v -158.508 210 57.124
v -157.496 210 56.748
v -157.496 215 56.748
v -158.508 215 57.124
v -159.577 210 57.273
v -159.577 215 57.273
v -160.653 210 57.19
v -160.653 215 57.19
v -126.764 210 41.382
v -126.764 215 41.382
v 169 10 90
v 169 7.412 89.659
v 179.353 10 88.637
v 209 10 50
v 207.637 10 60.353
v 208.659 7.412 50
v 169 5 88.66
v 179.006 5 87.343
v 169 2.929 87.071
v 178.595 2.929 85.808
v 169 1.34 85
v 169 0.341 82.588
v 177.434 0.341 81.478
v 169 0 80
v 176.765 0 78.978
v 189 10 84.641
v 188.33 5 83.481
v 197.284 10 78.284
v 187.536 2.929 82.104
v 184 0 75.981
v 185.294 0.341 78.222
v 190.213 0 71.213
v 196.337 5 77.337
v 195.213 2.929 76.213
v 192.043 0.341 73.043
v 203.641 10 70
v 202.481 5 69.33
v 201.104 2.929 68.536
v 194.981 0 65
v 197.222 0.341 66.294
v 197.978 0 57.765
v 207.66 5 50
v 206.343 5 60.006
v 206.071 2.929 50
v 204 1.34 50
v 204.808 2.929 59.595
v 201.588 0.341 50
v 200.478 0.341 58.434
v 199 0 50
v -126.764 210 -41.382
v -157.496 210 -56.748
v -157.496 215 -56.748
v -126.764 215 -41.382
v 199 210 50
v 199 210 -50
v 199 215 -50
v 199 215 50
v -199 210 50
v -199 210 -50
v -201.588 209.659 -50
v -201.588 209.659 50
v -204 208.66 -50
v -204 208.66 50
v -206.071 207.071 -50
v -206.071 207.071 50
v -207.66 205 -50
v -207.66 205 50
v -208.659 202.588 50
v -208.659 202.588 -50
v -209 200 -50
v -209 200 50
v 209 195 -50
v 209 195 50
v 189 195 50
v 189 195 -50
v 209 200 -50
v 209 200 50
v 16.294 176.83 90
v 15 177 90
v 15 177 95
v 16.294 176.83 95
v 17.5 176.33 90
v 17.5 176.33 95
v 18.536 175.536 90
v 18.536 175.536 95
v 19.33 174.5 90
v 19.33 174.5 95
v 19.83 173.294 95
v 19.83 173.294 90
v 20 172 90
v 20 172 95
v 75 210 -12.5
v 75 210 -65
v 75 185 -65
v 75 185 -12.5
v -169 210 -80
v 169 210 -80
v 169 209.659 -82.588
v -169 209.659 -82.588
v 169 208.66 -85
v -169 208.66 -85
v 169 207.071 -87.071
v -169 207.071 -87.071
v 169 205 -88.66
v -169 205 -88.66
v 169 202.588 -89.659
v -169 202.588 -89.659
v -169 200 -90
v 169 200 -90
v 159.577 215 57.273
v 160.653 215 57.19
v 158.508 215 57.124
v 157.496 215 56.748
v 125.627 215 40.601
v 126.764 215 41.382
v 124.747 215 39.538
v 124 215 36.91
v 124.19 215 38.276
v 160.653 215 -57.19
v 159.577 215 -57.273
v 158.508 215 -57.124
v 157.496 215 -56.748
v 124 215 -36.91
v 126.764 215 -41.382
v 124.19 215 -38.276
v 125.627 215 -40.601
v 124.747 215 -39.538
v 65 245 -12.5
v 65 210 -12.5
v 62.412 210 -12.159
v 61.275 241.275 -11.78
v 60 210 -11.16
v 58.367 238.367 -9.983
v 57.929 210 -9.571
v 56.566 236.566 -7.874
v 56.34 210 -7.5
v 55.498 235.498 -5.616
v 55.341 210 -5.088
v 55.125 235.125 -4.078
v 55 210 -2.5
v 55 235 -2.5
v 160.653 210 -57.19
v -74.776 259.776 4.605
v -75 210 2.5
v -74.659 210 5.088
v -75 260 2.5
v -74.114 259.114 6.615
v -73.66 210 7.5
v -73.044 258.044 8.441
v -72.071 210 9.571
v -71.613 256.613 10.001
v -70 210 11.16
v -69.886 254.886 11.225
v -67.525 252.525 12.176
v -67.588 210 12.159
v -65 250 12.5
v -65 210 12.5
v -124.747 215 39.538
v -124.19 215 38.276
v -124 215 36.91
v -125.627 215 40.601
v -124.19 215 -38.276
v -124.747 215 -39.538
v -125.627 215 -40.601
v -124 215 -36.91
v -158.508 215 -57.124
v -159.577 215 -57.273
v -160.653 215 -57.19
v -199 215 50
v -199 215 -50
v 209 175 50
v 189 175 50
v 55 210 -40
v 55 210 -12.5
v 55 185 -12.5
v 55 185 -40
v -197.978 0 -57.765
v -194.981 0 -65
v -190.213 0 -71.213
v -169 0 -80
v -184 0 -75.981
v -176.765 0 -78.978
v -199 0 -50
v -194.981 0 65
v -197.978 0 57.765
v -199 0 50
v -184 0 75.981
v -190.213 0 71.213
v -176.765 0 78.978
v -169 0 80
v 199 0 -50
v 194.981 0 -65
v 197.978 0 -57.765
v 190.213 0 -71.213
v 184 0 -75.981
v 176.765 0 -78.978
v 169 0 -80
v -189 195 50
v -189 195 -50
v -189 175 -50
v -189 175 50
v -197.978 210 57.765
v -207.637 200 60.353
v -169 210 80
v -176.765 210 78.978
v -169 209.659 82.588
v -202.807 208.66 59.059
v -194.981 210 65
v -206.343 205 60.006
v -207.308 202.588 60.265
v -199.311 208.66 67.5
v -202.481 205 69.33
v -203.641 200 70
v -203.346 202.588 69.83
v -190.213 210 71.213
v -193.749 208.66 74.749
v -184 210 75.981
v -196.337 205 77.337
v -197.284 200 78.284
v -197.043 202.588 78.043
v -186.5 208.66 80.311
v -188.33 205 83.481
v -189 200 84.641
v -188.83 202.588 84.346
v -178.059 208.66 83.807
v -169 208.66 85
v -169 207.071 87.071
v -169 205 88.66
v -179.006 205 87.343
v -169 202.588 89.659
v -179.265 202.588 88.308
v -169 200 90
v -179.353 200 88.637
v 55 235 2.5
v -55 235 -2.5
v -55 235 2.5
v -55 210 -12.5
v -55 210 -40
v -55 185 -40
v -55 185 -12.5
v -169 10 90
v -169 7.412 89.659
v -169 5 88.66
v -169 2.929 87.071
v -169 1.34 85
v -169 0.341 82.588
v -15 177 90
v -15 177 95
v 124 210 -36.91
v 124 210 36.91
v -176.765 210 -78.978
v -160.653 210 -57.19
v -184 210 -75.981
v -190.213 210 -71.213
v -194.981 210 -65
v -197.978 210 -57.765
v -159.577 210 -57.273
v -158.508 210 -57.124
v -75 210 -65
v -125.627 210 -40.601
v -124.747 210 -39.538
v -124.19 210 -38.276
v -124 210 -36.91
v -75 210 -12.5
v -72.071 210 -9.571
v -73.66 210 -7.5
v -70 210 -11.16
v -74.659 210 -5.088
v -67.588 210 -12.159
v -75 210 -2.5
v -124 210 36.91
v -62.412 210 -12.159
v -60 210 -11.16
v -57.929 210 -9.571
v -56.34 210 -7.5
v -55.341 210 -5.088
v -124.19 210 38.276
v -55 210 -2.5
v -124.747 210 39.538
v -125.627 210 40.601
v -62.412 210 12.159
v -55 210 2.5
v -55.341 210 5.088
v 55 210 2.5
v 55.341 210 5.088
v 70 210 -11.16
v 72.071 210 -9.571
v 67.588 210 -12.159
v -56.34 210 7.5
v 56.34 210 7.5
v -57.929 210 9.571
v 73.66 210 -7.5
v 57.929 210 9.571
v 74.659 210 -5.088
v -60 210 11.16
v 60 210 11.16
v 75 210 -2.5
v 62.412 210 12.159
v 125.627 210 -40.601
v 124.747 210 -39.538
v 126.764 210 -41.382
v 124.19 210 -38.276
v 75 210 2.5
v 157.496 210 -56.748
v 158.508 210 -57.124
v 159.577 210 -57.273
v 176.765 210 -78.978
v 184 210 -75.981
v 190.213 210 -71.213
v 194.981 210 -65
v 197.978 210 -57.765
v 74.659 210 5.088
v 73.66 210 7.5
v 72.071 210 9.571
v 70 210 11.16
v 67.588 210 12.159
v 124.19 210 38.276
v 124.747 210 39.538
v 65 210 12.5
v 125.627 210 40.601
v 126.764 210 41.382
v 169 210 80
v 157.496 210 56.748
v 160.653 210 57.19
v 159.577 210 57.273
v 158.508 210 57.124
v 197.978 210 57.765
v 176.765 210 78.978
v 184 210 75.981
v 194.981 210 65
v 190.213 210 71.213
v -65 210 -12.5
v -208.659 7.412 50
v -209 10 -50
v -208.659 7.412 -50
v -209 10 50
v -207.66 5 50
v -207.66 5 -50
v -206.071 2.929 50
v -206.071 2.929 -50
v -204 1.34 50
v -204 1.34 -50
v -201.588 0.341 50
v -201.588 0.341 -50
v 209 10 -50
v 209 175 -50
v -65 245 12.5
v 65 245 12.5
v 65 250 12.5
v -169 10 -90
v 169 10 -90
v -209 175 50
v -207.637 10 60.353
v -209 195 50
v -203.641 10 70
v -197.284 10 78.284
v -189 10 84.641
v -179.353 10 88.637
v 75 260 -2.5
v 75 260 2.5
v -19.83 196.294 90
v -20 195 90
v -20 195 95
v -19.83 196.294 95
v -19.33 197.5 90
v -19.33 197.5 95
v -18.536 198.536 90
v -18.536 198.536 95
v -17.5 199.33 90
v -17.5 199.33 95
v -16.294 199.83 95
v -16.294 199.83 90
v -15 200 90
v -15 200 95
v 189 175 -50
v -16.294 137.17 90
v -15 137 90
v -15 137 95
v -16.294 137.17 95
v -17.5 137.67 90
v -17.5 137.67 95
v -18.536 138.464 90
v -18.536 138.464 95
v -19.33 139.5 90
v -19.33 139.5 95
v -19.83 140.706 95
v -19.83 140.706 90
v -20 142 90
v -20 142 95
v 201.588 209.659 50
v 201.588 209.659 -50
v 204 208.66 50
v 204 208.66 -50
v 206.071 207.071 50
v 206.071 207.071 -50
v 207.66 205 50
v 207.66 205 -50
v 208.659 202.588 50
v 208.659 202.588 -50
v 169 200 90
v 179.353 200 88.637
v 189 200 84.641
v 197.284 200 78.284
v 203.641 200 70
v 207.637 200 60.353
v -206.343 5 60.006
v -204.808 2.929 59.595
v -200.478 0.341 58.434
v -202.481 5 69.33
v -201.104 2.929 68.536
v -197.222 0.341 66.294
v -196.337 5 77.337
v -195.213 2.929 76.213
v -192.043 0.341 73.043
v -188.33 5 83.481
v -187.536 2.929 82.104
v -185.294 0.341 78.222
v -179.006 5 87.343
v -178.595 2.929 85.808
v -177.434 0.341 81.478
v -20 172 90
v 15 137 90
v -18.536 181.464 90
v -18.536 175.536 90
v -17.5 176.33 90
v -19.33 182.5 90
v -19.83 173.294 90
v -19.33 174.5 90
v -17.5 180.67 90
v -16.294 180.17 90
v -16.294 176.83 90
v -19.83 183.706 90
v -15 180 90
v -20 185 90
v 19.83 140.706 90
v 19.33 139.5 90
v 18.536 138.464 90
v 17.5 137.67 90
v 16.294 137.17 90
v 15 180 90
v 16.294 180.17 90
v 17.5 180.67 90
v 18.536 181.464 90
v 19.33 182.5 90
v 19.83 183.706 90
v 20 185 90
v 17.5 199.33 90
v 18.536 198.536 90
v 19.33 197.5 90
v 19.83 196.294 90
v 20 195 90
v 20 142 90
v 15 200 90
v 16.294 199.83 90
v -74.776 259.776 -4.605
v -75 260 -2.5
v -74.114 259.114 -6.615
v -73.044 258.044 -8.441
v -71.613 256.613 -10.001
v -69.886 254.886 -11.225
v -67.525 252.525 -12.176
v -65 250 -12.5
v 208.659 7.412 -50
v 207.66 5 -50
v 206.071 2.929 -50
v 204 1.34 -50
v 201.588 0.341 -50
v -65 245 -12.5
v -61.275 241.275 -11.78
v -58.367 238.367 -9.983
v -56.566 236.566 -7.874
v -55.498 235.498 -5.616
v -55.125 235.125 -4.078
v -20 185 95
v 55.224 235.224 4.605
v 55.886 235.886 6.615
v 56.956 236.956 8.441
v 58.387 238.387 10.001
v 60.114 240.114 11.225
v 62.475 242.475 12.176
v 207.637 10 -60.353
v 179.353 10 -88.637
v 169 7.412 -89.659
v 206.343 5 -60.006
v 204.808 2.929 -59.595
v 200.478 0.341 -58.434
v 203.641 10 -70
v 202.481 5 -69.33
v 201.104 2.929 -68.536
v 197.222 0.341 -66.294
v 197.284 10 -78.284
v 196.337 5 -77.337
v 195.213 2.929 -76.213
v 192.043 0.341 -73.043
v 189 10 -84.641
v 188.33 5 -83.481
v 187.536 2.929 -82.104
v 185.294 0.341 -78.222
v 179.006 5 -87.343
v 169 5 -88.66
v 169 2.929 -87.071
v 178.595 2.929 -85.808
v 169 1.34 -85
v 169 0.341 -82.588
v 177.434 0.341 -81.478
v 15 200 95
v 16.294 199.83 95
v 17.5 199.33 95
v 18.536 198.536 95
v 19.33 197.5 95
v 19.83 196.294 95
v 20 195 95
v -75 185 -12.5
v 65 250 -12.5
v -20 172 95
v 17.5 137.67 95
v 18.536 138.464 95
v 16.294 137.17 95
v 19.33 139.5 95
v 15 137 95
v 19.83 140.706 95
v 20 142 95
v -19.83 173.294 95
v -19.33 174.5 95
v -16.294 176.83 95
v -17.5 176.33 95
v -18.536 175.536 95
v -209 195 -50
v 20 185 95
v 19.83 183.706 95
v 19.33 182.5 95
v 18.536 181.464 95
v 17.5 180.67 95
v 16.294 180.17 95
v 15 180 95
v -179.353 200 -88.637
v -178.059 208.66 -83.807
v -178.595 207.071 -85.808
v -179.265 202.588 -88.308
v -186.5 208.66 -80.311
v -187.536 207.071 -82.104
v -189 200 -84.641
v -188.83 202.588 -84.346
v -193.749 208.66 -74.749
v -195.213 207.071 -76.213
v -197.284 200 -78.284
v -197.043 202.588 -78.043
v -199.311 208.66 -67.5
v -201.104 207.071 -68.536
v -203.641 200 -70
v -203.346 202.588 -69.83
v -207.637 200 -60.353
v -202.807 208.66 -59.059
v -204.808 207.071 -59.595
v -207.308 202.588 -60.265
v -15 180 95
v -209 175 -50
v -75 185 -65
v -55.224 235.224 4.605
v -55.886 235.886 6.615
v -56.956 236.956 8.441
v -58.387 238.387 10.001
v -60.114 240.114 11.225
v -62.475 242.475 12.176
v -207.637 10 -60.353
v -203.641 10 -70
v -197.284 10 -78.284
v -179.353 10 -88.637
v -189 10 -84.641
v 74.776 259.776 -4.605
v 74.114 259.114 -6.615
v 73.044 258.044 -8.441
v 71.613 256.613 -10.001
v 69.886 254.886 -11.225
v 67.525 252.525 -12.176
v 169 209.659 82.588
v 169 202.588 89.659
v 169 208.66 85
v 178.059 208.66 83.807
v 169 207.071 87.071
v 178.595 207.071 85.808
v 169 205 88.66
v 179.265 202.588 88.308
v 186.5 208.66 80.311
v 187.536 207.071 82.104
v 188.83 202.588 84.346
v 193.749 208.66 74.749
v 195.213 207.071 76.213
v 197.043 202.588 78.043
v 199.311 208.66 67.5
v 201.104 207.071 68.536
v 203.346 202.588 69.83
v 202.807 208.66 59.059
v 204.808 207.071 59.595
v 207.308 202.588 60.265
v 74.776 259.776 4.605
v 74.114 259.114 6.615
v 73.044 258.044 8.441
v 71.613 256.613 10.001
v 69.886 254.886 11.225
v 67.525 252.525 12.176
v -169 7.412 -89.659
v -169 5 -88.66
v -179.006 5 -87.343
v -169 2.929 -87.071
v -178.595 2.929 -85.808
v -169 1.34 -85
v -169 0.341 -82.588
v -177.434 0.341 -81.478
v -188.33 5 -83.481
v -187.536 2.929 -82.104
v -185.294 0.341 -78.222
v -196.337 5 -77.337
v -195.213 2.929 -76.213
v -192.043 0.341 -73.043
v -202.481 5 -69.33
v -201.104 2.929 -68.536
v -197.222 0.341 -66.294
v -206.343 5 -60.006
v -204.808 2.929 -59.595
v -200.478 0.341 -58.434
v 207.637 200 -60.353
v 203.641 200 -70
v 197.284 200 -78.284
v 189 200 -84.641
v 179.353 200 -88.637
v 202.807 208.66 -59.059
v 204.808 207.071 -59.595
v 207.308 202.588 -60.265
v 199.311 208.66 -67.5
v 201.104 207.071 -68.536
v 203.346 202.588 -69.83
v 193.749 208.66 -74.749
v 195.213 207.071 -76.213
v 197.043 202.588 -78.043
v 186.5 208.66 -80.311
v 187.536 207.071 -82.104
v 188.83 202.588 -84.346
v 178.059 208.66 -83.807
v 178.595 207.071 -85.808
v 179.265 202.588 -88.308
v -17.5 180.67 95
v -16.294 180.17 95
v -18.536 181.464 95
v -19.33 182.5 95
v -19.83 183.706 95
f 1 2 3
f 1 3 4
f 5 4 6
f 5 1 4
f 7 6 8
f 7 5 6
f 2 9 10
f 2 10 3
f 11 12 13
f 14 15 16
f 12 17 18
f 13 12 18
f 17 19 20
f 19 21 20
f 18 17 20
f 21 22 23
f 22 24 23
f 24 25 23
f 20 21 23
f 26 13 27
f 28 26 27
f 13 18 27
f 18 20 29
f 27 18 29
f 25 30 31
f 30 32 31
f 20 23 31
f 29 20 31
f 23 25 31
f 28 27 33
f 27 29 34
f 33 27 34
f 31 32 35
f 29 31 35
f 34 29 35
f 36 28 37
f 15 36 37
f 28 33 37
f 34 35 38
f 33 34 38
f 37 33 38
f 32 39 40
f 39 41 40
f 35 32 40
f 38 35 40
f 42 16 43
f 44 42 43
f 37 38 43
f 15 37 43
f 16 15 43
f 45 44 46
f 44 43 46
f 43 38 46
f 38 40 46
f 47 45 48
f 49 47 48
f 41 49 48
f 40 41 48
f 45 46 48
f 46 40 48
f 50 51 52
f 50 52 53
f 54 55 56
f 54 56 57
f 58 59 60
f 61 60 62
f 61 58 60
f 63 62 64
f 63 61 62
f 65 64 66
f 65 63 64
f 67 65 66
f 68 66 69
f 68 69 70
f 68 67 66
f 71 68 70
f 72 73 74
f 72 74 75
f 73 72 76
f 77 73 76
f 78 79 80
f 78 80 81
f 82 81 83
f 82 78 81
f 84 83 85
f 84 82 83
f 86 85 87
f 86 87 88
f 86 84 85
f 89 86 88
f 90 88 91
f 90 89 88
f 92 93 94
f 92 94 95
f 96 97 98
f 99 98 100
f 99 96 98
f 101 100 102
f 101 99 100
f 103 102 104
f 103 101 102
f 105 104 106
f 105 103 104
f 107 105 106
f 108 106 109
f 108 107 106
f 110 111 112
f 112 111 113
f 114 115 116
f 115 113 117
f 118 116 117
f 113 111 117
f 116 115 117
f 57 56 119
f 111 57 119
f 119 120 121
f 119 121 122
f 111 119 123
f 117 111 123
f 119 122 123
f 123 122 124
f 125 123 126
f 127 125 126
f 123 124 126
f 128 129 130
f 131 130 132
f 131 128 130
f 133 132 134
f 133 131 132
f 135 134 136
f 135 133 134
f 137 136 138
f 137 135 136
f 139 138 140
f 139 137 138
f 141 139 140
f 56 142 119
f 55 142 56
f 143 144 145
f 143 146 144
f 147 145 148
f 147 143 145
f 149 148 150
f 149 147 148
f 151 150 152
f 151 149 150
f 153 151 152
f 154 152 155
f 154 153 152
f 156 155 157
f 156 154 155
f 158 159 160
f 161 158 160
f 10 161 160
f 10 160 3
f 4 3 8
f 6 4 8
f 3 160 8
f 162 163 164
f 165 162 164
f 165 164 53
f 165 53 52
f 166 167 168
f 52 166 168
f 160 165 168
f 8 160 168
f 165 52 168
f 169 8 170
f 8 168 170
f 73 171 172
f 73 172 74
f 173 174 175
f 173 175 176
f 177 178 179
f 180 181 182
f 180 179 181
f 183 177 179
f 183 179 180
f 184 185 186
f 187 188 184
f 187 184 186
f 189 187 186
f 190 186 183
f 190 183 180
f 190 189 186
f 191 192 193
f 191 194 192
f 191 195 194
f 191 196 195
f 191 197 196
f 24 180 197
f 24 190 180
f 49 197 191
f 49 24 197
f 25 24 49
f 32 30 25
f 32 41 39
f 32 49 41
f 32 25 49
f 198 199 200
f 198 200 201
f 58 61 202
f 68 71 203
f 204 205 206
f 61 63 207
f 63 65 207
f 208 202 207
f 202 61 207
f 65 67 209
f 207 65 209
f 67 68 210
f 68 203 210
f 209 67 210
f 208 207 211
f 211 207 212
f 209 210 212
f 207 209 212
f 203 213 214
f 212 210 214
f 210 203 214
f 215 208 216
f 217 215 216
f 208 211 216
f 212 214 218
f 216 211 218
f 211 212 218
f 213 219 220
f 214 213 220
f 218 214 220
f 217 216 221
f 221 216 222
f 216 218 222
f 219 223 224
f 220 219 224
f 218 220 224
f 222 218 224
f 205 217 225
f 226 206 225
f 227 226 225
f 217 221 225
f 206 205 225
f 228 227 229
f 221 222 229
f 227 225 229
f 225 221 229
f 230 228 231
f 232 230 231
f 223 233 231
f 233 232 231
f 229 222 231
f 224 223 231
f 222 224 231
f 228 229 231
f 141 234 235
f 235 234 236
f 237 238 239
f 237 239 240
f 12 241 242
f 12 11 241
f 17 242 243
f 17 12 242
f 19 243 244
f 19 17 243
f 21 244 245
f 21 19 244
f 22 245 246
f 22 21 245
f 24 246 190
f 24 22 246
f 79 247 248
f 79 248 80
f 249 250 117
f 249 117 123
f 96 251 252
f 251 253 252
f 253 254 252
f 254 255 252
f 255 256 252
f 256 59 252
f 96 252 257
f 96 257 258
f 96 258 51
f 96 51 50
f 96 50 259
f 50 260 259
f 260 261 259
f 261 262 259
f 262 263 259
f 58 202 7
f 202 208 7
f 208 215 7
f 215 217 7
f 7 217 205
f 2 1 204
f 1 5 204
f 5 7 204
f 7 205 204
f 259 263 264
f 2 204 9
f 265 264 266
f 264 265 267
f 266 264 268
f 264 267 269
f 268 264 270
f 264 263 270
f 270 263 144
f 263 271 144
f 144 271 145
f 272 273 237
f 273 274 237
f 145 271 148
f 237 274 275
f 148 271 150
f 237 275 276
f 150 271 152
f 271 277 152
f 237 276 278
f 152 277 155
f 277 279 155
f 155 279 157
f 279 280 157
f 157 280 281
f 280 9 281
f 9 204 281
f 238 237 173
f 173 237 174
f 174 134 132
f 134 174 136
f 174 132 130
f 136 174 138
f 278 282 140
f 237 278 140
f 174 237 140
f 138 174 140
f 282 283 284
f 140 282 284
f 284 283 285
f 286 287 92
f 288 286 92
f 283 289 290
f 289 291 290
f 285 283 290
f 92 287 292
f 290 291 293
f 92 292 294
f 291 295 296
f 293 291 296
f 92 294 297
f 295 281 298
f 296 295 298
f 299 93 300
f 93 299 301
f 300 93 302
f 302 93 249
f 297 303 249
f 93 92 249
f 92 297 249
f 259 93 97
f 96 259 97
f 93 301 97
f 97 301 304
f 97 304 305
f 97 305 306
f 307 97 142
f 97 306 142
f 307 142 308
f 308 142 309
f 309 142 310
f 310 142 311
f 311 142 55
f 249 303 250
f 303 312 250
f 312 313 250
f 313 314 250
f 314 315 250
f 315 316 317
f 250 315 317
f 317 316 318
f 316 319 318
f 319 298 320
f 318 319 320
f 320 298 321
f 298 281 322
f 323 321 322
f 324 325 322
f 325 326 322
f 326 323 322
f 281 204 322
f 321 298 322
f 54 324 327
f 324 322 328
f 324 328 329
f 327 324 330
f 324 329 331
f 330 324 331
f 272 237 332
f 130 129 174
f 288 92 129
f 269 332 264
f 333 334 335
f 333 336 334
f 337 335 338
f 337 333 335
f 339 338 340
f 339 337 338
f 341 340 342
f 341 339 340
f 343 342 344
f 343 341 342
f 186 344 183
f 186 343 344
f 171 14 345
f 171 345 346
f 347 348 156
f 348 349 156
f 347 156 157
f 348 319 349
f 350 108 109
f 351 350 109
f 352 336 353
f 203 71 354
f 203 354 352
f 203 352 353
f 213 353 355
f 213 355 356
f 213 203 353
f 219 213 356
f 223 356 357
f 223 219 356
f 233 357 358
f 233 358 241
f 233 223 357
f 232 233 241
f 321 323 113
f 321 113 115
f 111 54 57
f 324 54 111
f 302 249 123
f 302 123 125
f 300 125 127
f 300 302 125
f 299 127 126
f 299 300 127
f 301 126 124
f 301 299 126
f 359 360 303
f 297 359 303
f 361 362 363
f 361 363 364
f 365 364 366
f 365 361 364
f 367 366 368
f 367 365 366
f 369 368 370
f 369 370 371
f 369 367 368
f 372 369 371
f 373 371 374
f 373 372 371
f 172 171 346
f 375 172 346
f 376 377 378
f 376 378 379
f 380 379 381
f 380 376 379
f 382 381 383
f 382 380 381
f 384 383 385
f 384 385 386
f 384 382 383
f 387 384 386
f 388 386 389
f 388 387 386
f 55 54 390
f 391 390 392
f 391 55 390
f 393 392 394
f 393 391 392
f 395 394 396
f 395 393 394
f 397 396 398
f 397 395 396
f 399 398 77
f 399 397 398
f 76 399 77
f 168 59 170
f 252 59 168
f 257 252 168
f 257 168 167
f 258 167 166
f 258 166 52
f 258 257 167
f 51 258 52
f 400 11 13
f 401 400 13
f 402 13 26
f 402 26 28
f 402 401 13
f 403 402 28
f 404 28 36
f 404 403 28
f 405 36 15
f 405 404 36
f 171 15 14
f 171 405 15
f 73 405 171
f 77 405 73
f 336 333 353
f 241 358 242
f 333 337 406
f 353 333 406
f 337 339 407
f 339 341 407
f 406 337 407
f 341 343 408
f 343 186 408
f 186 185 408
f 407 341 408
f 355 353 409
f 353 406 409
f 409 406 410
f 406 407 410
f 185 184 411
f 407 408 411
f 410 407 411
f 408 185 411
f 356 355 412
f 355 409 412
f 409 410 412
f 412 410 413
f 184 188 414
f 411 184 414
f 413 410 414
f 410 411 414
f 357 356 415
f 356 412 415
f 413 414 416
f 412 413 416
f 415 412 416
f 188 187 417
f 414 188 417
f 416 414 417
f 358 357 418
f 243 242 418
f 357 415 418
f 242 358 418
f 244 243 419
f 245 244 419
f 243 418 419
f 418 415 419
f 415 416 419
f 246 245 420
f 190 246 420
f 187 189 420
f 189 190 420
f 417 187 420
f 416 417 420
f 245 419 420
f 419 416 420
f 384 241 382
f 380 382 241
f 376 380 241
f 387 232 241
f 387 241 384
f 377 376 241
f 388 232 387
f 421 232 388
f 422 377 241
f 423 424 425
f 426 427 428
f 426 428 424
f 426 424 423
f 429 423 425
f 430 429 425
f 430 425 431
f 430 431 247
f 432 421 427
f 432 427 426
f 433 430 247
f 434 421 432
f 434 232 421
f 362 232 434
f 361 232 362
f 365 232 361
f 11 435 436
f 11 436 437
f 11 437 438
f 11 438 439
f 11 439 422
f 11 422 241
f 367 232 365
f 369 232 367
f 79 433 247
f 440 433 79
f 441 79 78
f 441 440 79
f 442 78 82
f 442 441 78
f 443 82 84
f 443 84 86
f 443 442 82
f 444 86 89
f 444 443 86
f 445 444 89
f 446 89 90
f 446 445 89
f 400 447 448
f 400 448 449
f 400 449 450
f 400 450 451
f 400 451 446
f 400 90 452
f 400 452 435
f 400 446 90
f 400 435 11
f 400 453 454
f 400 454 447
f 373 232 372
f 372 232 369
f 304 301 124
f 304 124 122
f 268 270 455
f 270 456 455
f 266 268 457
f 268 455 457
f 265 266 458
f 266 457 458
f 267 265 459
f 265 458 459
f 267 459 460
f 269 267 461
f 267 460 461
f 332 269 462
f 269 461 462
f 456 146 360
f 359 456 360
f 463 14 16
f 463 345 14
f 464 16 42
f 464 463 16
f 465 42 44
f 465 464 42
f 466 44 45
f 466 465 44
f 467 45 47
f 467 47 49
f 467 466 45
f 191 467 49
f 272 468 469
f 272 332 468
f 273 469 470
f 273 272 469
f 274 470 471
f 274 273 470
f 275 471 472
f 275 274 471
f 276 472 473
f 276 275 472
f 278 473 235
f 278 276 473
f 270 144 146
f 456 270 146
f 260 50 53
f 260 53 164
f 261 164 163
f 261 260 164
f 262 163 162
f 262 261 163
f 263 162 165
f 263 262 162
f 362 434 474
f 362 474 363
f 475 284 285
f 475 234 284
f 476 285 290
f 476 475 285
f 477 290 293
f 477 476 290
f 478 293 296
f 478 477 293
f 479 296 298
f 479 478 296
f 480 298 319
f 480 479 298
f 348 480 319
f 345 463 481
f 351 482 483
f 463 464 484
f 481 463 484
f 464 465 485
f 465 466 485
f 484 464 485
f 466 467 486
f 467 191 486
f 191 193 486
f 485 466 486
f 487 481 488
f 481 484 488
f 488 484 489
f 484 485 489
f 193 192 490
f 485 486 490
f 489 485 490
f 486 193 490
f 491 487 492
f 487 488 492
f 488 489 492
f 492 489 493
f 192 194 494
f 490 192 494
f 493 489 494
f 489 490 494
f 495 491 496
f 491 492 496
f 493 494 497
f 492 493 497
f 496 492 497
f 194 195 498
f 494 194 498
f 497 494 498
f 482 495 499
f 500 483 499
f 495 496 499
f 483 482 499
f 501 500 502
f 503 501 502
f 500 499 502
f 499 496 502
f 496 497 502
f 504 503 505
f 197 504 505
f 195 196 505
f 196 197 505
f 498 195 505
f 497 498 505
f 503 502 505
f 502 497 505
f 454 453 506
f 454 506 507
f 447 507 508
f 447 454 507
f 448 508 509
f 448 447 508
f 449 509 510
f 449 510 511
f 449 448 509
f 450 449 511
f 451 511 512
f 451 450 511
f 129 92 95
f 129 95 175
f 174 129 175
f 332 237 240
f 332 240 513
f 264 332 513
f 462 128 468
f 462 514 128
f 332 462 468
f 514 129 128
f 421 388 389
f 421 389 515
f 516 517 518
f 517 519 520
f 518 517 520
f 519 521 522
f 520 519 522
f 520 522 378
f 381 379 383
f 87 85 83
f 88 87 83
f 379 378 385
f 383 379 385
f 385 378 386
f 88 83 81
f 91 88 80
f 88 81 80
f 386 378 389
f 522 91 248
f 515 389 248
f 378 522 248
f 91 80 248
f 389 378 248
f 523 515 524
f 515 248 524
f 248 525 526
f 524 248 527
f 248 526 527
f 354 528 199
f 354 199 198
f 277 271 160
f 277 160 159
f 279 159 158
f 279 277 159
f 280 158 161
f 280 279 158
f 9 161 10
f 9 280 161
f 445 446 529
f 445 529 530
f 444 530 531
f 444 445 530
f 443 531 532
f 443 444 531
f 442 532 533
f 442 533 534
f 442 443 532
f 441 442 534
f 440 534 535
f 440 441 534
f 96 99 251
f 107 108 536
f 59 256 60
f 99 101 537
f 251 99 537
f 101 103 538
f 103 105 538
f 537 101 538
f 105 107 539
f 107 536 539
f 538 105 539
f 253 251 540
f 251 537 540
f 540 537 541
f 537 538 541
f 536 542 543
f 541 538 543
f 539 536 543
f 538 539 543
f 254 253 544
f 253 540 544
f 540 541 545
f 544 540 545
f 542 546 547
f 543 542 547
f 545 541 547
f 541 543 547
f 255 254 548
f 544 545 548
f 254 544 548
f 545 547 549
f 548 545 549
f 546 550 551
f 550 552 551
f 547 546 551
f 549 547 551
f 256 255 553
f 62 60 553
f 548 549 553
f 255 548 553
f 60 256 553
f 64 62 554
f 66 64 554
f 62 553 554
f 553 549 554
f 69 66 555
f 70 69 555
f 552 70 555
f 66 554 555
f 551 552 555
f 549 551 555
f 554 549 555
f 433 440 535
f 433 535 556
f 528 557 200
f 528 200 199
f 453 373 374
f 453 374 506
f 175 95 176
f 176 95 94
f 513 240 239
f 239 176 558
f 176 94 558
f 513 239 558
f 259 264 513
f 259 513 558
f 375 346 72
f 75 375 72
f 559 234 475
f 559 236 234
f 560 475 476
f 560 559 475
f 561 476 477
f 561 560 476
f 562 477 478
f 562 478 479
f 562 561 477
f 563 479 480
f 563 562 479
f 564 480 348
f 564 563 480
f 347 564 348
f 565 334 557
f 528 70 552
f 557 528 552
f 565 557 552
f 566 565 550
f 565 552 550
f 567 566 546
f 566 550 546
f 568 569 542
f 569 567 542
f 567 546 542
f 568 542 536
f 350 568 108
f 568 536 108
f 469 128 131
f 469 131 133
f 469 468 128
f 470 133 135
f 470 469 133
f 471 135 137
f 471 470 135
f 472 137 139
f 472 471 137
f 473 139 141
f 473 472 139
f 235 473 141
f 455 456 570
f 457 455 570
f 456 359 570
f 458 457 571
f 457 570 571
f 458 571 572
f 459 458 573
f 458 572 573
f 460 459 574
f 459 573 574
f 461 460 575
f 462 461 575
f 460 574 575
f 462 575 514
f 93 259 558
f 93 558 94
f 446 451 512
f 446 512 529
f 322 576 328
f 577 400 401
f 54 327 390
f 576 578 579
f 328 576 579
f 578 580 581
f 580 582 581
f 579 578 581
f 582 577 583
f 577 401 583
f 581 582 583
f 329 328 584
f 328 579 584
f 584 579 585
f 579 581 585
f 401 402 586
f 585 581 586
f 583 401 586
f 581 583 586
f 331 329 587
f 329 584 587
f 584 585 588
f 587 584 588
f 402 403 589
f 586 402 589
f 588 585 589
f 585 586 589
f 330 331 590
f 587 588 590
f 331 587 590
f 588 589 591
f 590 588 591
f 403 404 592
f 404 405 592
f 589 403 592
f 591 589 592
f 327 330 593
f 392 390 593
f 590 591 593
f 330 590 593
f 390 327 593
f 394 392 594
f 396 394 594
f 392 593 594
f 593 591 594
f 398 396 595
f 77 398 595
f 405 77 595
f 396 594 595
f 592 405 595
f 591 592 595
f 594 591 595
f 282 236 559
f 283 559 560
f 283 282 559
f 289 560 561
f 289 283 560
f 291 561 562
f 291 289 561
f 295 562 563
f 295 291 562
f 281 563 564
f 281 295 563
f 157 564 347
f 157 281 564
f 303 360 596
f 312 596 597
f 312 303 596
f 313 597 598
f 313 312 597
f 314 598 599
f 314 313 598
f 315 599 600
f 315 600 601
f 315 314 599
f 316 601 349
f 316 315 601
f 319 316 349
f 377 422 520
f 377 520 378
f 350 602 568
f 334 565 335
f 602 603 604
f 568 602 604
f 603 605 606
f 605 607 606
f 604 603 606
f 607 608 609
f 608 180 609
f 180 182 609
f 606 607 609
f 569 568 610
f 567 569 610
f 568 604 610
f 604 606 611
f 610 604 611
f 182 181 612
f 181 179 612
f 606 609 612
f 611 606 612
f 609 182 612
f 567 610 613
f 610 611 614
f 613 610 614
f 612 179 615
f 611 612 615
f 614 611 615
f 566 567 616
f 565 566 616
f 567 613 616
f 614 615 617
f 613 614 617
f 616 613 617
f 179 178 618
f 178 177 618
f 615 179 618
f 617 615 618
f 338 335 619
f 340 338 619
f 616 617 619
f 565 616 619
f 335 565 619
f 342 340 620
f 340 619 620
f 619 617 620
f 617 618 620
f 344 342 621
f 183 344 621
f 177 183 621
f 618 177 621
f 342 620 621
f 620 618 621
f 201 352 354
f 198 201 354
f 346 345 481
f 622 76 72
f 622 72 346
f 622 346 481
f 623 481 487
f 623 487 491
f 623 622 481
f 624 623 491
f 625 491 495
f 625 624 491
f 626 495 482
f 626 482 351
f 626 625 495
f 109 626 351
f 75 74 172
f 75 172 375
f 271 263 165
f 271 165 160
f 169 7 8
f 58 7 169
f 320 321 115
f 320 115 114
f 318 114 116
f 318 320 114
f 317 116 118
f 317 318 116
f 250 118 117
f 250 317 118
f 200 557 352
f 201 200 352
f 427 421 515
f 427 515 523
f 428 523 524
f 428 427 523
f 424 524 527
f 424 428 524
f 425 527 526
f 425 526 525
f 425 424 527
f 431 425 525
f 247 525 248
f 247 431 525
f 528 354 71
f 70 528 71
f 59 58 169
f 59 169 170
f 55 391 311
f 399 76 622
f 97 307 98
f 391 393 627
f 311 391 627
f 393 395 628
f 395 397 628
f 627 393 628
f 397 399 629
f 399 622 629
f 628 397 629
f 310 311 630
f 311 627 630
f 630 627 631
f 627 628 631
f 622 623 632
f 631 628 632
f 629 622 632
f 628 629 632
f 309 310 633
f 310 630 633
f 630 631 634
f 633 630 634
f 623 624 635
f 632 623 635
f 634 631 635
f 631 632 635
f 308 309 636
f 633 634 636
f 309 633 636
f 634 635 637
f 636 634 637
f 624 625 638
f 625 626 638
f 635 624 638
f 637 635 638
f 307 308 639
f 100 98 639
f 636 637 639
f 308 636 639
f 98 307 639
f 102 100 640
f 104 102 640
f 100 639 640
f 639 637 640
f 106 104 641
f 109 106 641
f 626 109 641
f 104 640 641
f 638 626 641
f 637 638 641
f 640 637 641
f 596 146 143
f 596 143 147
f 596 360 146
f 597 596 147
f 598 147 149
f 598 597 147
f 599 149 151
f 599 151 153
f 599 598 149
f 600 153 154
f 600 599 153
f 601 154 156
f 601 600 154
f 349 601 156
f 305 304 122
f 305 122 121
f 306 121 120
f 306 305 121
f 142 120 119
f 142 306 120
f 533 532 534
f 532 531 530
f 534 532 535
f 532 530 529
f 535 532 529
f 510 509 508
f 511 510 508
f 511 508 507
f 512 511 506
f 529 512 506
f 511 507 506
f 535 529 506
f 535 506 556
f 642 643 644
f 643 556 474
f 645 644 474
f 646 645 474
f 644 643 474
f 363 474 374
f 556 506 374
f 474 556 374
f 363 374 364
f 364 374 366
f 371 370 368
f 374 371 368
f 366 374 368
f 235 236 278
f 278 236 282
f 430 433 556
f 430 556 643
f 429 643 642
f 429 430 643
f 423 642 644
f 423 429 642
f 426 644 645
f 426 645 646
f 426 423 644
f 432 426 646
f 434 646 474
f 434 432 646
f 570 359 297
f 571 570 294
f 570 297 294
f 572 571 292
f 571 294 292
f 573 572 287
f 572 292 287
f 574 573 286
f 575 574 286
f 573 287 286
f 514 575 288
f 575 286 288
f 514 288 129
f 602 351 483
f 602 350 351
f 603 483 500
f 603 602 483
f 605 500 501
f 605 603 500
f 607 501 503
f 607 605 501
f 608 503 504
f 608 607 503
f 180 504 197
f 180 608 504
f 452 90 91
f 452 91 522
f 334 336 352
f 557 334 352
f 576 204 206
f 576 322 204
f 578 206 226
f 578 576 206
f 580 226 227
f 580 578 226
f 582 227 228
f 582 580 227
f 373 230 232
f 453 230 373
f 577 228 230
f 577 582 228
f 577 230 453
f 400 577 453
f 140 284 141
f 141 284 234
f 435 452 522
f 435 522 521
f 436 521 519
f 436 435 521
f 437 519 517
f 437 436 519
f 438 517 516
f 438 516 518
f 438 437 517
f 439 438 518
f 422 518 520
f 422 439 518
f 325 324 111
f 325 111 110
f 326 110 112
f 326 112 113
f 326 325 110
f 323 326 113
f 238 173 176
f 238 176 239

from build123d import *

# Parameters (mm, degrees)
SKIZZE1_W                       = 418
SKIZZE1_H                       = 210
AUFSATZ_LINEAR_AUSTRAGEN1_DEPTH = 90
VERRUNDUNG1_R                   = 40
SCHNITT_LINEAR_AUSTRAGEN1_DEPTH = 25
AUFSATZ_LINEAR_AUSTRAGEN2_DEPTH = 12.5
VERRUNDUNG2_R                   = 10
SKIZZE5_W                       = 100
SKIZZE5_H                       = 20
SCHNITT_LINEAR_AUSTRAGEN2_DEPTH = 20
SKIZZE6_W                       = 100
SKIZZE6_H                       = 20
SCHNITT_LINEAR_AUSTRAGEN3_DEPTH = 20
VERRUNDUNG4_R                   = 10
AUFSATZ_LINEAR_AUSTRAGEN3_DEPTH = 5
AUFSATZ_LINEAR_AUSTRAGEN4_DEPTH = 5


with BuildPart() as part:
    # Skizze1 → Aufsatz-Linear austragen1 (new, symmetric)
    with BuildSketch(Plane.XY):
        with Locations((0, 105)):
            Rectangle(SKIZZE1_W, SKIZZE1_H)
    extrude(amount=AUFSATZ_LINEAR_AUSTRAGEN1_DEPTH, both=True)

    # Verrundung1
    verrundung1_edges = [part.edges().sort_by_distance(p)[0] for p in [
        (209, 105, 90),
        (-209, 105, 90),
        (209, 105, -90),
        (-209, 105, -90),
    ]]
    fillet(verrundung1_edges, radius=VERRUNDUNG1_R)

    # Skizze3 → Schnitt-Linear austragen1 (cut)
    with BuildSketch(Plane(origin=(0, 210, 0), x_dir=(1, 0, 0), z_dir=(0, 1, 0))):
        Polygon((-75, -10), (-75, 65), (75, 65), (75, -10), (55, -10), (55, 40), (-55, 40), (-55, -10), align=None)
    extrude(amount=-SCHNITT_LINEAR_AUSTRAGEN1_DEPTH, mode=Mode.SUBTRACT)

    # Skizze4 → Aufsatz-Linear austragen2 (add, symmetric)
    with BuildSketch(Plane.XY):
        Polygon((-75, 185), (-75, 260), (75, 260), (75, 185), (55, 185), (55, 235), (-55, 235), (-55, 185), align=None)
    extrude(amount=AUFSATZ_LINEAR_AUSTRAGEN2_DEPTH, both=True)

    # Verrundung2
    verrundung2_edges = [part.edges().sort_by_distance(p)[0] for p in [
        (-75, 235, -12.5),
        (-55, 222.5, -12.5),
        (55, 222.5, -12.5),
        (0, 235, -12.5),
        (0, 260, -12.5),
        (75, 235, -12.5),
        (75, 235, 12.5),
        (55, 222.5, 12.5),
        (0, 260, 12.5),
        (0, 235, 12.5),
        (-55, 222.5, 12.5),
        (-75, 235, 12.5),
    ]]
    fillet(verrundung2_edges, radius=VERRUNDUNG2_R - 0.0001)  # a hair under: the kernel refuses the full size

    # Skizze5 → Schnitt-Linear austragen2 (cut)
    with BuildSketch(Plane(origin=(209, 0, 0), x_dir=(0, 0, -1), z_dir=(1, 0, 0))):
        with Locations((0, 185)):
            Rectangle(SKIZZE5_W, SKIZZE5_H)
    extrude(amount=-SCHNITT_LINEAR_AUSTRAGEN2_DEPTH, mode=Mode.SUBTRACT)

    # Skizze6 → Schnitt-Linear austragen3 (cut)
    with BuildSketch(Plane.ZY.offset(209)):
        with Locations((0, 185)):
            Rectangle(SKIZZE6_W, SKIZZE6_H)
    extrude(amount=-SCHNITT_LINEAR_AUSTRAGEN3_DEPTH, mode=Mode.SUBTRACT)

    # Verrundung4
    verrundung4_edges = [part.edges().sort_by_distance(p)[0] for p in [
        (0, 0, 90),
        (0, 210, 90),
        (0, 210, -90),
        (-209, 210, 0),
        (209, 210, 0),
        (-197.284271247, 210, 78.284271247),
        (-197.284271247, 210, -78.284271247),
        (197.284271247, 210, -78.284271247),
        (197.284271247, 210, 78.284271247),
        (209, 0, 0),
        (0, 0, -90),
        (-209, 0, 0),
        (-197.284271247, 0, 78.284271247),
        (-197.284271247, 0, -78.284271247),
        (197.284271247, 0, -78.284271247),
        (197.284271247, 0, 78.284271247),
    ]]
    fillet(verrundung4_edges, radius=VERRUNDUNG4_R)

    # Skizze7 → Aufsatz-Linear austragen3 (add)
    with BuildSketch(Plane(origin=(0, 210, 0), x_dir=(1, 0, 0), z_dir=(0, 1, 0))):
        with BuildLine():
            Line((-199, 50), (-160.65313505, 57.190037178))
            ThreePointArc((-160.65313505, 57.190037178), (-159.038186315, 57.227347612), (-157.495624397, 56.747812198))
            Line((-157.495624397, 56.747812198), (-126.763932023, 41.381966011))
            ThreePointArc((-126.763932023, 41.381966011), (-124.746745958, 39.538485617), (-124, 36.909830056))
            Line((-124, 36.909830056), (-124, -36.909830056))
            ThreePointArc((-124, -36.909830056), (-124.746745958, -39.538485617), (-126.763932023, -41.381966011))
            Line((-126.763932023, -41.381966011), (-157.495624397, -56.747812198))
            ThreePointArc((-157.495624397, -56.747812198), (-159.038186315, -57.227347612), (-160.65313505, -57.190037178))
            Line((-160.65313505, -57.190037178), (-199, -50))
            Line((-199, -50), (-199, 50))
        make_face()
        with BuildLine():
            Line((199, 50), (199, -50))
            Line((199, -50), (160.65313505, -57.190037178))
            ThreePointArc((160.65313505, -57.190037178), (159.038186315, -57.227347612), (157.495624397, -56.747812198))
            Line((157.495624397, -56.747812198), (126.763932023, -41.381966011))
            ThreePointArc((126.763932023, -41.381966011), (124.746745958, -39.538485617), (124, -36.909830056))
            Line((124, -36.909830056), (124, 36.909830056))
            ThreePointArc((124, 36.909830056), (124.746745958, 39.538485617), (126.763932023, 41.381966011))
            Line((126.763932023, 41.381966011), (157.495624397, 56.747812198))
            ThreePointArc((157.495624397, 56.747812198), (159.038186315, 57.227347612), (160.65313505, 57.190037178))
            Line((160.65313505, 57.190037178), (199, 50))
        make_face()
    extrude(amount=AUFSATZ_LINEAR_AUSTRAGEN3_DEPTH)

    # Skizze8 → Aufsatz-Linear austragen4 (add)
    with BuildSketch(Plane.XY.offset(90)):
        with BuildLine():
            Line((-15, 200), (15, 200))
            ThreePointArc((15, 200), (18.535533906, 198.535533906), (20, 195))
            Line((20, 195), (20, 185))
            ThreePointArc((20, 185), (18.535533906, 181.464466094), (15, 180))
            Line((15, 180), (-15, 180))
            ThreePointArc((-15, 180), (-18.535533906, 181.464466094), (-20, 185))
            Line((-20, 185), (-20, 195))
            ThreePointArc((-20, 195), (-18.535533906, 198.535533906), (-15, 200))
        make_face()
        with BuildLine():
            Line((-15, 177), (15, 177))
            ThreePointArc((15, 177), (18.535533906, 175.535533906), (20, 172))
            Line((20, 172), (20, 142))
            ThreePointArc((20, 142), (18.535533906, 138.464466094), (15, 137))
            Line((15, 137), (-15, 137))
            ThreePointArc((-15, 137), (-18.535533906, 138.464466094), (-20, 142))
            Line((-20, 142), (-20, 172))
            ThreePointArc((-20, 172), (-18.535533906, 175.535533906), (-15, 177))
        make_face()
    extrude(amount=AUFSATZ_LINEAR_AUSTRAGEN4_DEPTH)


solid = part.part
